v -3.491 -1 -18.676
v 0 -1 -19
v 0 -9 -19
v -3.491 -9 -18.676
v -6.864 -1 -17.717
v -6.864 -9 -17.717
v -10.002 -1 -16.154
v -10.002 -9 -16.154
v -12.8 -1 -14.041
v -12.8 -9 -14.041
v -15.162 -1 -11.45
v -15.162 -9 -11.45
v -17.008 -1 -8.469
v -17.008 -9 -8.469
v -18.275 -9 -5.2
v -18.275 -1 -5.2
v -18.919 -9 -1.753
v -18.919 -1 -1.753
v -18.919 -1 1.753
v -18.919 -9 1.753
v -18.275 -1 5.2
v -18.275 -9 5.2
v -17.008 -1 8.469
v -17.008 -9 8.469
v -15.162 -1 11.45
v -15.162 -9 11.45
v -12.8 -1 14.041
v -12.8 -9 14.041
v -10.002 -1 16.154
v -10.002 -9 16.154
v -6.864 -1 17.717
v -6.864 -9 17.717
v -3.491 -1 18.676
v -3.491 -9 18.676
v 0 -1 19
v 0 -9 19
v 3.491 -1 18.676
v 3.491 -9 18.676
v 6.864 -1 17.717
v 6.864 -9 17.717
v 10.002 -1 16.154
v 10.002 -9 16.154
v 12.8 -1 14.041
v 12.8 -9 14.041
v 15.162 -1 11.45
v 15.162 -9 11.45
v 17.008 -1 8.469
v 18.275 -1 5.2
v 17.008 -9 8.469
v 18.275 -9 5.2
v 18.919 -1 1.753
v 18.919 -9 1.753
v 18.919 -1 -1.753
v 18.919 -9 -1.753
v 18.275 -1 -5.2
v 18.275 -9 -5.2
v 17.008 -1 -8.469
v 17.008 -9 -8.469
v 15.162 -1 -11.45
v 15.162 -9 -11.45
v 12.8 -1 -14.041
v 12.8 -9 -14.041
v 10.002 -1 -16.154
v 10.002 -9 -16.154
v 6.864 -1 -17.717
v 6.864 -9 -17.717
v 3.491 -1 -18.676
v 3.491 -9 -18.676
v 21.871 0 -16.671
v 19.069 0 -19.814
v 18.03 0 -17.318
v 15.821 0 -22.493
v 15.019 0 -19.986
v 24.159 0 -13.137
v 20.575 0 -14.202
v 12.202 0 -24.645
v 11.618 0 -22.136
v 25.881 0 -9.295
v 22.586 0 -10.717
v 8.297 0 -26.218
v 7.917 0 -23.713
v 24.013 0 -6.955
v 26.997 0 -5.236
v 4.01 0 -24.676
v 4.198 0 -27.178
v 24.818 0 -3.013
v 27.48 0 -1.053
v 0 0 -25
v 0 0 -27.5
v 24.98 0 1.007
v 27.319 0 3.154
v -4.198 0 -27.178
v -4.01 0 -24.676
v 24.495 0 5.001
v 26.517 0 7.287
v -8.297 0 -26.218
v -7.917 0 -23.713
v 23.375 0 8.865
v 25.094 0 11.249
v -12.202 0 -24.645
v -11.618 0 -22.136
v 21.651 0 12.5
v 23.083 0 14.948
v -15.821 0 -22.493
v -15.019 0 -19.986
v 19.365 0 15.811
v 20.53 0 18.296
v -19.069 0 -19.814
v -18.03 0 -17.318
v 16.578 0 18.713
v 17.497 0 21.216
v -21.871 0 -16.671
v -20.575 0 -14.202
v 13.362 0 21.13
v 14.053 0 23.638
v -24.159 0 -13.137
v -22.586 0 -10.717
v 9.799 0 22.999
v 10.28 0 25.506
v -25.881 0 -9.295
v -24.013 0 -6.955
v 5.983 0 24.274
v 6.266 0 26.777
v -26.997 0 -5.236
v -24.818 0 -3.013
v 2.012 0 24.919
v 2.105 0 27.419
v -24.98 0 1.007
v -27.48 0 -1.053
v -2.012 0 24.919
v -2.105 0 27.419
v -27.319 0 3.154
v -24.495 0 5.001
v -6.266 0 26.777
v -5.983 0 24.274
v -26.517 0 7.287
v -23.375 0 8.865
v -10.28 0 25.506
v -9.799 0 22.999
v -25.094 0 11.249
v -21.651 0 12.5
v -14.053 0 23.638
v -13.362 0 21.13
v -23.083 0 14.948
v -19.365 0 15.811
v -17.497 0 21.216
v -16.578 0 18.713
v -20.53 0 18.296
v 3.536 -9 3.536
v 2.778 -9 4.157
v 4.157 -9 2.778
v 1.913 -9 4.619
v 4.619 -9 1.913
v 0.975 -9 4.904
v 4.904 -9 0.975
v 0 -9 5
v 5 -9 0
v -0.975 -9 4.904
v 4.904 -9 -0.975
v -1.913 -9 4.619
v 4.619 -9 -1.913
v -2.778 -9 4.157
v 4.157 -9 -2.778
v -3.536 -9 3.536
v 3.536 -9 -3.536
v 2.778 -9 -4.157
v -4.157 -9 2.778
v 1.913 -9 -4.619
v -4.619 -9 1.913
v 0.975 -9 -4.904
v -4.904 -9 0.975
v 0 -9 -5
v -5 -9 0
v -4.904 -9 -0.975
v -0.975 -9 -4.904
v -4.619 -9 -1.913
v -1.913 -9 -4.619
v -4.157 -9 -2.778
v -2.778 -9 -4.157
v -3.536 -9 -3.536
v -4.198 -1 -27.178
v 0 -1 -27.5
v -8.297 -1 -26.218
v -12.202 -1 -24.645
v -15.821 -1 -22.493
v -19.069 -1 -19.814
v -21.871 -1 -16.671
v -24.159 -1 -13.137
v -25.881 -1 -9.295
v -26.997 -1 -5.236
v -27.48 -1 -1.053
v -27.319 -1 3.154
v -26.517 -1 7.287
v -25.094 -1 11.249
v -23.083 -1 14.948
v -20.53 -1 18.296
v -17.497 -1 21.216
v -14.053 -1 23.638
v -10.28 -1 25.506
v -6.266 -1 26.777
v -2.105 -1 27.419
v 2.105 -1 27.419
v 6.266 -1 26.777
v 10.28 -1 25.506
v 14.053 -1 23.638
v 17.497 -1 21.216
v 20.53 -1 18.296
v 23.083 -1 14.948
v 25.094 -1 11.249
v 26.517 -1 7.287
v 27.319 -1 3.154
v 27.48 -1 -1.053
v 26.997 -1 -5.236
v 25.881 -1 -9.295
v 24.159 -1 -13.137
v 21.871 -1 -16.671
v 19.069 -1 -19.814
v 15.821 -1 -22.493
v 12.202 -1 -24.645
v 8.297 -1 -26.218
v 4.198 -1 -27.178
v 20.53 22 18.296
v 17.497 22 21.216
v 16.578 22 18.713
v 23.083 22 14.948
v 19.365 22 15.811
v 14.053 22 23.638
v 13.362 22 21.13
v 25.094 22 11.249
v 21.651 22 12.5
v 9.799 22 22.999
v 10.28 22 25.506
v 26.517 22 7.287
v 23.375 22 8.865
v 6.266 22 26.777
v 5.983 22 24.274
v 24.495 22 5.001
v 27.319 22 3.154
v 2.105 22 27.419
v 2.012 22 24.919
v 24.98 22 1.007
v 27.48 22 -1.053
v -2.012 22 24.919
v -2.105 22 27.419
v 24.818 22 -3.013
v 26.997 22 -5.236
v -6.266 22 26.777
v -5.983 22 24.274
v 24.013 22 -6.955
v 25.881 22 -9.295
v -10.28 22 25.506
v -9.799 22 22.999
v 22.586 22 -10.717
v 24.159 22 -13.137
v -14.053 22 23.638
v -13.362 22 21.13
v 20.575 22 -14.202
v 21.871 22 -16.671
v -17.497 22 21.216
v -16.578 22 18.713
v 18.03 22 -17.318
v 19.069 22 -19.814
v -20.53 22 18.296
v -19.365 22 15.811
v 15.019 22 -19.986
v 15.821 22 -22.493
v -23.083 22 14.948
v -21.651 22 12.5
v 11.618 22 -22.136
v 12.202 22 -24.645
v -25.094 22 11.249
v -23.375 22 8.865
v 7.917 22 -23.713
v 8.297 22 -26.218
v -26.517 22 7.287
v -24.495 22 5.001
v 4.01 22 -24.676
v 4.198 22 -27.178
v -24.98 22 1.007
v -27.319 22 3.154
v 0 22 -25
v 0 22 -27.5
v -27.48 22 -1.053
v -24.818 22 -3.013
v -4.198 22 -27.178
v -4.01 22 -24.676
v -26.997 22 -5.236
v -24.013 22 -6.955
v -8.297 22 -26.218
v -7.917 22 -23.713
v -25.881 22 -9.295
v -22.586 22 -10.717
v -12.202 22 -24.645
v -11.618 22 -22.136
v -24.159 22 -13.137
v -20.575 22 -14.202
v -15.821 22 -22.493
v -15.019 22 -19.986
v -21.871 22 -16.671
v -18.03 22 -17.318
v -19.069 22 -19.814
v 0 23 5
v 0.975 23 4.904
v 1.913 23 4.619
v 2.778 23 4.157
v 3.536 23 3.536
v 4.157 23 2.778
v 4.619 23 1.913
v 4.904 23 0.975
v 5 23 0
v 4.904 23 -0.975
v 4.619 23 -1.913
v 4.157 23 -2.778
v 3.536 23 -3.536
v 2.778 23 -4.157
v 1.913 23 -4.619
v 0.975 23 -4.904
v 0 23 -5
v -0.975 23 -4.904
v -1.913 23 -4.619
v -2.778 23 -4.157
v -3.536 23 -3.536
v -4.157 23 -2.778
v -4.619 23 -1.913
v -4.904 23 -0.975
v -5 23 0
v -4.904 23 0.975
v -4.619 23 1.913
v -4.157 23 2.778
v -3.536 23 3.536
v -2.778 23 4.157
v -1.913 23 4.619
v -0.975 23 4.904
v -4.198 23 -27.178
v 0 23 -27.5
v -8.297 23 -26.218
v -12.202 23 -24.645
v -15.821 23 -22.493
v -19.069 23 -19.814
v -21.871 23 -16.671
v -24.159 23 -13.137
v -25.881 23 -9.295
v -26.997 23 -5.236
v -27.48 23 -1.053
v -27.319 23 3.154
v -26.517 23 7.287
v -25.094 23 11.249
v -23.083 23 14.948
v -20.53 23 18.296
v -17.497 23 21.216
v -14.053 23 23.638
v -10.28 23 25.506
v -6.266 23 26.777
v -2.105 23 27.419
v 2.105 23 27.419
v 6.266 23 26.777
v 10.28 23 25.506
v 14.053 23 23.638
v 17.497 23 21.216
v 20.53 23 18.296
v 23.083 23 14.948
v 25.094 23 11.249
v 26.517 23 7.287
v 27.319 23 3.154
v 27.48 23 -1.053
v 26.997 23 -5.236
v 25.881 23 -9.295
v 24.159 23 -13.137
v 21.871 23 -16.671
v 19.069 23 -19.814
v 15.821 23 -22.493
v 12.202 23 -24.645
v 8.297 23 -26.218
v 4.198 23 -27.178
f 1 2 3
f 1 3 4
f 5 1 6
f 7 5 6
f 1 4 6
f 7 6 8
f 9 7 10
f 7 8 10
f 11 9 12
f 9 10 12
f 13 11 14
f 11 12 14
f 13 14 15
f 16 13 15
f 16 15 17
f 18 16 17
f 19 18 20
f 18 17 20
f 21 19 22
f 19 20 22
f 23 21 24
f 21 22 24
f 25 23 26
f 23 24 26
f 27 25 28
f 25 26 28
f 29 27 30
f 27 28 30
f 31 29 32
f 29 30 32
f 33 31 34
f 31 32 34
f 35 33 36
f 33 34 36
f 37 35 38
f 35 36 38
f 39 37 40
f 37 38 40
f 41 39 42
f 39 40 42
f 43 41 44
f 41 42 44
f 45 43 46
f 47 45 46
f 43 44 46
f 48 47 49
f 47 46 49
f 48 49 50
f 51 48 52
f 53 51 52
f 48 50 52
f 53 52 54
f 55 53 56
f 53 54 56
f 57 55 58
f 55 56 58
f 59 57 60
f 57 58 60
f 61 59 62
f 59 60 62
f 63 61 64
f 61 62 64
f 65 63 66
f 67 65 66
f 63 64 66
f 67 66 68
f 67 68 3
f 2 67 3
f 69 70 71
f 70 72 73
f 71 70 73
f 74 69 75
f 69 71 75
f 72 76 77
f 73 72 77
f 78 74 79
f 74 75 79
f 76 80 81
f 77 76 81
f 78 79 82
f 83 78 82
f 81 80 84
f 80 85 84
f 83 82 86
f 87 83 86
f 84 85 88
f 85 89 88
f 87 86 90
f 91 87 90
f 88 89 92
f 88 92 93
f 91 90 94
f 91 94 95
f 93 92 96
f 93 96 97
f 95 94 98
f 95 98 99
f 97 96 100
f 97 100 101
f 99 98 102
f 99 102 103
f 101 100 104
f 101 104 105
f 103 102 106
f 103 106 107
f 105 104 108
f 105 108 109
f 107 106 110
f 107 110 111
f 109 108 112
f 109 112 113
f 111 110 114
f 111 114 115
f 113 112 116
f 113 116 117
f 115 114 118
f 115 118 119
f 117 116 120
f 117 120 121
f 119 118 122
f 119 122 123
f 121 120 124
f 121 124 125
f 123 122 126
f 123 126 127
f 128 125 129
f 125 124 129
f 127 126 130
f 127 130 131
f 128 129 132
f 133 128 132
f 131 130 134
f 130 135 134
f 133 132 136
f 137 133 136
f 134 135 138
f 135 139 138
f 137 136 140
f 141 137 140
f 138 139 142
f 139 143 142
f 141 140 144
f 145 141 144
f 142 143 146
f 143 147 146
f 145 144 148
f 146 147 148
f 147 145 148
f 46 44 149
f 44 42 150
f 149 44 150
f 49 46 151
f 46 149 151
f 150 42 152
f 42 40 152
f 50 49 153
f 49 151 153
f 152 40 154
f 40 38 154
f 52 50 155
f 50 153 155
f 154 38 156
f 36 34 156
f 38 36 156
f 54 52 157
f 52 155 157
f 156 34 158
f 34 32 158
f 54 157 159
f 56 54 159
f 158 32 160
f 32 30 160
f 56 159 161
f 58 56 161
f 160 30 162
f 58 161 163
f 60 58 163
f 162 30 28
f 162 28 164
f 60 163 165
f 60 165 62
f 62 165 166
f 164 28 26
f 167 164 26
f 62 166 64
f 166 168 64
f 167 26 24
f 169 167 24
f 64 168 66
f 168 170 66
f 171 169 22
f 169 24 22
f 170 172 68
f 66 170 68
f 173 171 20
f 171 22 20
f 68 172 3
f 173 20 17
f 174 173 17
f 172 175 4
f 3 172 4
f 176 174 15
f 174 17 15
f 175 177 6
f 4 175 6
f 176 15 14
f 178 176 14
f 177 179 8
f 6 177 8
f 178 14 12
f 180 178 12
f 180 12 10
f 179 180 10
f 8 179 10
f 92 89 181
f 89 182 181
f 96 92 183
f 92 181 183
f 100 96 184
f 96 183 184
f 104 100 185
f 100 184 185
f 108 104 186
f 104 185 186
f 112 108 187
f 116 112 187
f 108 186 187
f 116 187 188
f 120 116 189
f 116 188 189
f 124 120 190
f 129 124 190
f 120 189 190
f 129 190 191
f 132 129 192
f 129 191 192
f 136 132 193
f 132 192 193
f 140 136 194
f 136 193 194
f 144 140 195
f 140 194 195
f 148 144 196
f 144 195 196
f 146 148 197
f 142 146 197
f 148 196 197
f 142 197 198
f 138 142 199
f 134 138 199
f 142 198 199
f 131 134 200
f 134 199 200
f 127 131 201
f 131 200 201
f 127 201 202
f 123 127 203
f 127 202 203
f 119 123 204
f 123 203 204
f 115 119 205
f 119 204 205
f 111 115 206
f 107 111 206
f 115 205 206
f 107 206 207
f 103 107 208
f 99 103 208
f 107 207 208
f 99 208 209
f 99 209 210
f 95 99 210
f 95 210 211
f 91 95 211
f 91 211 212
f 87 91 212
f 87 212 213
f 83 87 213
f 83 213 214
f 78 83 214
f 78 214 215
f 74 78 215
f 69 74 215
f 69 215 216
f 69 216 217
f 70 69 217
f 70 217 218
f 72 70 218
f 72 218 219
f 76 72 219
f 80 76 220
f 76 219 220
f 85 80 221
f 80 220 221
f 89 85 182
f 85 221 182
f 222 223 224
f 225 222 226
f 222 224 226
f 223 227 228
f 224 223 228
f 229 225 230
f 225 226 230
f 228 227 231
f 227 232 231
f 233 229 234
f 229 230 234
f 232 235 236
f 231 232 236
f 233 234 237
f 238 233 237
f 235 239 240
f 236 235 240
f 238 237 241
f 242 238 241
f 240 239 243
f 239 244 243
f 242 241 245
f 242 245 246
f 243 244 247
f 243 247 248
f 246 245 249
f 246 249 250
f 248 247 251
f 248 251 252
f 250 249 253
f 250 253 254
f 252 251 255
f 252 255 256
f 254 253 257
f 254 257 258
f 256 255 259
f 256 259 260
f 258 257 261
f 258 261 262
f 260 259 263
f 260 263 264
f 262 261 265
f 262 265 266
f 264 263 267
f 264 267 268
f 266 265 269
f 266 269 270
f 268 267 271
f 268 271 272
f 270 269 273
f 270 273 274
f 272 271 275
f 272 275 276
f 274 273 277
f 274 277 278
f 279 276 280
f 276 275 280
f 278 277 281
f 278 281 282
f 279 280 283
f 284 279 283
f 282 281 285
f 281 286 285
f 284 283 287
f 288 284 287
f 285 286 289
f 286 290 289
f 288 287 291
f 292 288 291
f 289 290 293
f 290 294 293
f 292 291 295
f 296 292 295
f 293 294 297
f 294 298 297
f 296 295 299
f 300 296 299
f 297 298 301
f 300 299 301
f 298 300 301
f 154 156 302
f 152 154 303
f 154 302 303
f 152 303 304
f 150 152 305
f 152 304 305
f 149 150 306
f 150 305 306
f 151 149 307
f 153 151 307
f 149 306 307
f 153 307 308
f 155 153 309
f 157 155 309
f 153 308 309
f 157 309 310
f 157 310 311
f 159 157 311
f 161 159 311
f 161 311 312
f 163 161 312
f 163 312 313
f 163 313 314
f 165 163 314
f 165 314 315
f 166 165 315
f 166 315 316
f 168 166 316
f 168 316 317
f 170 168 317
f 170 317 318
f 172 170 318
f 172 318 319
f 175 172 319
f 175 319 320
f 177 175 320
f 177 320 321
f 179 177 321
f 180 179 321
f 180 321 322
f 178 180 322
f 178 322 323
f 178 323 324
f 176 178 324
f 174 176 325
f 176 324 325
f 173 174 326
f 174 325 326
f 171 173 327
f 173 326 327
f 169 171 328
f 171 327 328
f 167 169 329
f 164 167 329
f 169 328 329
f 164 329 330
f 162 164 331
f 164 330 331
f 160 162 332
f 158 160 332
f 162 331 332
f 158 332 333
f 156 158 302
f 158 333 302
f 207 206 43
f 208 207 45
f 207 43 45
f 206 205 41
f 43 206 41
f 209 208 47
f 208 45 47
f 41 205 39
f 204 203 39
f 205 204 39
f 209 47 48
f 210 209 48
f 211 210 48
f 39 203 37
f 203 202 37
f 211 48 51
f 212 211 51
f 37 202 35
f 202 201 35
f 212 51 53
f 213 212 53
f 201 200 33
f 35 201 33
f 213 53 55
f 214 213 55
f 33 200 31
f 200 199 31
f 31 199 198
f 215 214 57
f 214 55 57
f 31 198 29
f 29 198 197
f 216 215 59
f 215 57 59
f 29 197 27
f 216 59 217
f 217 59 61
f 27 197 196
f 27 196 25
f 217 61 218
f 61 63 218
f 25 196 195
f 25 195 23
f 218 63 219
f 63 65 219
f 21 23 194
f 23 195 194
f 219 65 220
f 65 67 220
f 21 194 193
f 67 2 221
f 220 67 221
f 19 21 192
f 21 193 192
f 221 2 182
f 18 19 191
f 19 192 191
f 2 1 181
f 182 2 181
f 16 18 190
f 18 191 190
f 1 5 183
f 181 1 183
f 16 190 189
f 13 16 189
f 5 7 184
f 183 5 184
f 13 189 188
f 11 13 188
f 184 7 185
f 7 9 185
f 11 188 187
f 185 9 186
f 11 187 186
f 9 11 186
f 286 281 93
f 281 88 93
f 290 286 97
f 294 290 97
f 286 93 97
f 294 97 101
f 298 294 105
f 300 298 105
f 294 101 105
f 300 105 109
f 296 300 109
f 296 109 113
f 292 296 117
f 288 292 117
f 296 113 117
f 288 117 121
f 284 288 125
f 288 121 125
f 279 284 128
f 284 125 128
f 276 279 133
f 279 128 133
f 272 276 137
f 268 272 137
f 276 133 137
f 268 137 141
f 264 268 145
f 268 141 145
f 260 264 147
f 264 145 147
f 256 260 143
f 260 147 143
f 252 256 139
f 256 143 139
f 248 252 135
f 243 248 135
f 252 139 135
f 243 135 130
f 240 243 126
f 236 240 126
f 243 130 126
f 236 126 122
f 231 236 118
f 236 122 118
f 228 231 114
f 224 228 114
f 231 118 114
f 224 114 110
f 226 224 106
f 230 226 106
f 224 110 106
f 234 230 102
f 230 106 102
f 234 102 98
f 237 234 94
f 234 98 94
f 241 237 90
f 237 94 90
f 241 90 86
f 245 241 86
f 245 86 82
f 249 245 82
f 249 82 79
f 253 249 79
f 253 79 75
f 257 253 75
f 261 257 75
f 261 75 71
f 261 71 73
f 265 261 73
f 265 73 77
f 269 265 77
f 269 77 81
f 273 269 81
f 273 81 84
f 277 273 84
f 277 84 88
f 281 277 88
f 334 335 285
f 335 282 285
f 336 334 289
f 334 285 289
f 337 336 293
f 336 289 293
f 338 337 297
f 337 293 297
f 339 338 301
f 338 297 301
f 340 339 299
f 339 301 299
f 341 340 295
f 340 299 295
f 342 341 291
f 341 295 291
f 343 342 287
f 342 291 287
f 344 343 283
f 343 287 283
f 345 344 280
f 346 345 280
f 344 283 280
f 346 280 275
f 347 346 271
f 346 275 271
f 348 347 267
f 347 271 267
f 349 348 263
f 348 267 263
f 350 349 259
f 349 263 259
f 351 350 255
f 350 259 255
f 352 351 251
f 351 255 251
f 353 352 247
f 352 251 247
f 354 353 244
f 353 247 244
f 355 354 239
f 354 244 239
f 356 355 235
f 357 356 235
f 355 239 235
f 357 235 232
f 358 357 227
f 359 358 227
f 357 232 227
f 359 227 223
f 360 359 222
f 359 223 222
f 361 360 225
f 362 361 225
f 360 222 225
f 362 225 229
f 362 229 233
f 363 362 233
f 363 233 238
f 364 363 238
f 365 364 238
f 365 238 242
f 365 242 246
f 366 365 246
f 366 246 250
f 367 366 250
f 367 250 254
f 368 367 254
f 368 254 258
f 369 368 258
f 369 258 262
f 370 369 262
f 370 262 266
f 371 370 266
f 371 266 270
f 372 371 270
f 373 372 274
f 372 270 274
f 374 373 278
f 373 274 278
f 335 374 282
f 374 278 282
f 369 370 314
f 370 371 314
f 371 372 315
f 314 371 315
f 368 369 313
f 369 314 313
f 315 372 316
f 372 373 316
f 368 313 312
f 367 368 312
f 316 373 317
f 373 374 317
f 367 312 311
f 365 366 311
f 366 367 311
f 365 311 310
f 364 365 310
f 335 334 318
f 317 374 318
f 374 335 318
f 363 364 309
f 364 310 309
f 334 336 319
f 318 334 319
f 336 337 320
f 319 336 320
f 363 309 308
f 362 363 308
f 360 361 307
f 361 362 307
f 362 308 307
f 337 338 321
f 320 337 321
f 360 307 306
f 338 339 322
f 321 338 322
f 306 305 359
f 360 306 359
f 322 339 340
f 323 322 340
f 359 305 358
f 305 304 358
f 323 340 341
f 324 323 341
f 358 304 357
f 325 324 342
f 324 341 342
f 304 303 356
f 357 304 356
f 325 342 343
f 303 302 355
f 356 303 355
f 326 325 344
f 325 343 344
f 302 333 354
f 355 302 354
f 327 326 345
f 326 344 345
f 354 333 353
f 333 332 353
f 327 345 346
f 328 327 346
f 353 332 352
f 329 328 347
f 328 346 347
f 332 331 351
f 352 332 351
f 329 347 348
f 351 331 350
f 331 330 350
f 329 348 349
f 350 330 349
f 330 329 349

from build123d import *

# Parameters (mm, degrees)
SKETCH2_R          = 5
CUT_EXTRUDE1_DEPTH = 34


with BuildPart() as part:
    # Sketch1 → Revolve1 (revolve)
    with BuildSketch(Plane.XY, mode=Mode.PRIVATE) as revolve1_sk:
        Polygon((0, 0), (0, 22), (0, 23), (-27.5, 23), (-27.5, 22), (-25, 22), (-25, 0), (-27.5, 0), (-27.5, -1), (-19, -1), (-19, -9), (0, -9), (0, -1), align=None)
    revolve(revolve1_sk.sketch.rotate(Axis((0, 0, 0), (0, 1, 0)), 270), axis=Axis((0, 0, 0), (0, 1, 0)))

    # Sketch2 → Cut-Extrude1 (cut)
    with BuildSketch(Plane(origin=(0, 23, 0), x_dir=(1, 0, 0), z_dir=(0, 1, 0))):
        with Locations(Location((0, 0, 0), (0, 0, 270))):
            Circle(SKETCH2_R)
    extrude(amount=-CUT_EXTRUDE1_DEPTH, mode=Mode.SUBTRACT)


solid = part.part
